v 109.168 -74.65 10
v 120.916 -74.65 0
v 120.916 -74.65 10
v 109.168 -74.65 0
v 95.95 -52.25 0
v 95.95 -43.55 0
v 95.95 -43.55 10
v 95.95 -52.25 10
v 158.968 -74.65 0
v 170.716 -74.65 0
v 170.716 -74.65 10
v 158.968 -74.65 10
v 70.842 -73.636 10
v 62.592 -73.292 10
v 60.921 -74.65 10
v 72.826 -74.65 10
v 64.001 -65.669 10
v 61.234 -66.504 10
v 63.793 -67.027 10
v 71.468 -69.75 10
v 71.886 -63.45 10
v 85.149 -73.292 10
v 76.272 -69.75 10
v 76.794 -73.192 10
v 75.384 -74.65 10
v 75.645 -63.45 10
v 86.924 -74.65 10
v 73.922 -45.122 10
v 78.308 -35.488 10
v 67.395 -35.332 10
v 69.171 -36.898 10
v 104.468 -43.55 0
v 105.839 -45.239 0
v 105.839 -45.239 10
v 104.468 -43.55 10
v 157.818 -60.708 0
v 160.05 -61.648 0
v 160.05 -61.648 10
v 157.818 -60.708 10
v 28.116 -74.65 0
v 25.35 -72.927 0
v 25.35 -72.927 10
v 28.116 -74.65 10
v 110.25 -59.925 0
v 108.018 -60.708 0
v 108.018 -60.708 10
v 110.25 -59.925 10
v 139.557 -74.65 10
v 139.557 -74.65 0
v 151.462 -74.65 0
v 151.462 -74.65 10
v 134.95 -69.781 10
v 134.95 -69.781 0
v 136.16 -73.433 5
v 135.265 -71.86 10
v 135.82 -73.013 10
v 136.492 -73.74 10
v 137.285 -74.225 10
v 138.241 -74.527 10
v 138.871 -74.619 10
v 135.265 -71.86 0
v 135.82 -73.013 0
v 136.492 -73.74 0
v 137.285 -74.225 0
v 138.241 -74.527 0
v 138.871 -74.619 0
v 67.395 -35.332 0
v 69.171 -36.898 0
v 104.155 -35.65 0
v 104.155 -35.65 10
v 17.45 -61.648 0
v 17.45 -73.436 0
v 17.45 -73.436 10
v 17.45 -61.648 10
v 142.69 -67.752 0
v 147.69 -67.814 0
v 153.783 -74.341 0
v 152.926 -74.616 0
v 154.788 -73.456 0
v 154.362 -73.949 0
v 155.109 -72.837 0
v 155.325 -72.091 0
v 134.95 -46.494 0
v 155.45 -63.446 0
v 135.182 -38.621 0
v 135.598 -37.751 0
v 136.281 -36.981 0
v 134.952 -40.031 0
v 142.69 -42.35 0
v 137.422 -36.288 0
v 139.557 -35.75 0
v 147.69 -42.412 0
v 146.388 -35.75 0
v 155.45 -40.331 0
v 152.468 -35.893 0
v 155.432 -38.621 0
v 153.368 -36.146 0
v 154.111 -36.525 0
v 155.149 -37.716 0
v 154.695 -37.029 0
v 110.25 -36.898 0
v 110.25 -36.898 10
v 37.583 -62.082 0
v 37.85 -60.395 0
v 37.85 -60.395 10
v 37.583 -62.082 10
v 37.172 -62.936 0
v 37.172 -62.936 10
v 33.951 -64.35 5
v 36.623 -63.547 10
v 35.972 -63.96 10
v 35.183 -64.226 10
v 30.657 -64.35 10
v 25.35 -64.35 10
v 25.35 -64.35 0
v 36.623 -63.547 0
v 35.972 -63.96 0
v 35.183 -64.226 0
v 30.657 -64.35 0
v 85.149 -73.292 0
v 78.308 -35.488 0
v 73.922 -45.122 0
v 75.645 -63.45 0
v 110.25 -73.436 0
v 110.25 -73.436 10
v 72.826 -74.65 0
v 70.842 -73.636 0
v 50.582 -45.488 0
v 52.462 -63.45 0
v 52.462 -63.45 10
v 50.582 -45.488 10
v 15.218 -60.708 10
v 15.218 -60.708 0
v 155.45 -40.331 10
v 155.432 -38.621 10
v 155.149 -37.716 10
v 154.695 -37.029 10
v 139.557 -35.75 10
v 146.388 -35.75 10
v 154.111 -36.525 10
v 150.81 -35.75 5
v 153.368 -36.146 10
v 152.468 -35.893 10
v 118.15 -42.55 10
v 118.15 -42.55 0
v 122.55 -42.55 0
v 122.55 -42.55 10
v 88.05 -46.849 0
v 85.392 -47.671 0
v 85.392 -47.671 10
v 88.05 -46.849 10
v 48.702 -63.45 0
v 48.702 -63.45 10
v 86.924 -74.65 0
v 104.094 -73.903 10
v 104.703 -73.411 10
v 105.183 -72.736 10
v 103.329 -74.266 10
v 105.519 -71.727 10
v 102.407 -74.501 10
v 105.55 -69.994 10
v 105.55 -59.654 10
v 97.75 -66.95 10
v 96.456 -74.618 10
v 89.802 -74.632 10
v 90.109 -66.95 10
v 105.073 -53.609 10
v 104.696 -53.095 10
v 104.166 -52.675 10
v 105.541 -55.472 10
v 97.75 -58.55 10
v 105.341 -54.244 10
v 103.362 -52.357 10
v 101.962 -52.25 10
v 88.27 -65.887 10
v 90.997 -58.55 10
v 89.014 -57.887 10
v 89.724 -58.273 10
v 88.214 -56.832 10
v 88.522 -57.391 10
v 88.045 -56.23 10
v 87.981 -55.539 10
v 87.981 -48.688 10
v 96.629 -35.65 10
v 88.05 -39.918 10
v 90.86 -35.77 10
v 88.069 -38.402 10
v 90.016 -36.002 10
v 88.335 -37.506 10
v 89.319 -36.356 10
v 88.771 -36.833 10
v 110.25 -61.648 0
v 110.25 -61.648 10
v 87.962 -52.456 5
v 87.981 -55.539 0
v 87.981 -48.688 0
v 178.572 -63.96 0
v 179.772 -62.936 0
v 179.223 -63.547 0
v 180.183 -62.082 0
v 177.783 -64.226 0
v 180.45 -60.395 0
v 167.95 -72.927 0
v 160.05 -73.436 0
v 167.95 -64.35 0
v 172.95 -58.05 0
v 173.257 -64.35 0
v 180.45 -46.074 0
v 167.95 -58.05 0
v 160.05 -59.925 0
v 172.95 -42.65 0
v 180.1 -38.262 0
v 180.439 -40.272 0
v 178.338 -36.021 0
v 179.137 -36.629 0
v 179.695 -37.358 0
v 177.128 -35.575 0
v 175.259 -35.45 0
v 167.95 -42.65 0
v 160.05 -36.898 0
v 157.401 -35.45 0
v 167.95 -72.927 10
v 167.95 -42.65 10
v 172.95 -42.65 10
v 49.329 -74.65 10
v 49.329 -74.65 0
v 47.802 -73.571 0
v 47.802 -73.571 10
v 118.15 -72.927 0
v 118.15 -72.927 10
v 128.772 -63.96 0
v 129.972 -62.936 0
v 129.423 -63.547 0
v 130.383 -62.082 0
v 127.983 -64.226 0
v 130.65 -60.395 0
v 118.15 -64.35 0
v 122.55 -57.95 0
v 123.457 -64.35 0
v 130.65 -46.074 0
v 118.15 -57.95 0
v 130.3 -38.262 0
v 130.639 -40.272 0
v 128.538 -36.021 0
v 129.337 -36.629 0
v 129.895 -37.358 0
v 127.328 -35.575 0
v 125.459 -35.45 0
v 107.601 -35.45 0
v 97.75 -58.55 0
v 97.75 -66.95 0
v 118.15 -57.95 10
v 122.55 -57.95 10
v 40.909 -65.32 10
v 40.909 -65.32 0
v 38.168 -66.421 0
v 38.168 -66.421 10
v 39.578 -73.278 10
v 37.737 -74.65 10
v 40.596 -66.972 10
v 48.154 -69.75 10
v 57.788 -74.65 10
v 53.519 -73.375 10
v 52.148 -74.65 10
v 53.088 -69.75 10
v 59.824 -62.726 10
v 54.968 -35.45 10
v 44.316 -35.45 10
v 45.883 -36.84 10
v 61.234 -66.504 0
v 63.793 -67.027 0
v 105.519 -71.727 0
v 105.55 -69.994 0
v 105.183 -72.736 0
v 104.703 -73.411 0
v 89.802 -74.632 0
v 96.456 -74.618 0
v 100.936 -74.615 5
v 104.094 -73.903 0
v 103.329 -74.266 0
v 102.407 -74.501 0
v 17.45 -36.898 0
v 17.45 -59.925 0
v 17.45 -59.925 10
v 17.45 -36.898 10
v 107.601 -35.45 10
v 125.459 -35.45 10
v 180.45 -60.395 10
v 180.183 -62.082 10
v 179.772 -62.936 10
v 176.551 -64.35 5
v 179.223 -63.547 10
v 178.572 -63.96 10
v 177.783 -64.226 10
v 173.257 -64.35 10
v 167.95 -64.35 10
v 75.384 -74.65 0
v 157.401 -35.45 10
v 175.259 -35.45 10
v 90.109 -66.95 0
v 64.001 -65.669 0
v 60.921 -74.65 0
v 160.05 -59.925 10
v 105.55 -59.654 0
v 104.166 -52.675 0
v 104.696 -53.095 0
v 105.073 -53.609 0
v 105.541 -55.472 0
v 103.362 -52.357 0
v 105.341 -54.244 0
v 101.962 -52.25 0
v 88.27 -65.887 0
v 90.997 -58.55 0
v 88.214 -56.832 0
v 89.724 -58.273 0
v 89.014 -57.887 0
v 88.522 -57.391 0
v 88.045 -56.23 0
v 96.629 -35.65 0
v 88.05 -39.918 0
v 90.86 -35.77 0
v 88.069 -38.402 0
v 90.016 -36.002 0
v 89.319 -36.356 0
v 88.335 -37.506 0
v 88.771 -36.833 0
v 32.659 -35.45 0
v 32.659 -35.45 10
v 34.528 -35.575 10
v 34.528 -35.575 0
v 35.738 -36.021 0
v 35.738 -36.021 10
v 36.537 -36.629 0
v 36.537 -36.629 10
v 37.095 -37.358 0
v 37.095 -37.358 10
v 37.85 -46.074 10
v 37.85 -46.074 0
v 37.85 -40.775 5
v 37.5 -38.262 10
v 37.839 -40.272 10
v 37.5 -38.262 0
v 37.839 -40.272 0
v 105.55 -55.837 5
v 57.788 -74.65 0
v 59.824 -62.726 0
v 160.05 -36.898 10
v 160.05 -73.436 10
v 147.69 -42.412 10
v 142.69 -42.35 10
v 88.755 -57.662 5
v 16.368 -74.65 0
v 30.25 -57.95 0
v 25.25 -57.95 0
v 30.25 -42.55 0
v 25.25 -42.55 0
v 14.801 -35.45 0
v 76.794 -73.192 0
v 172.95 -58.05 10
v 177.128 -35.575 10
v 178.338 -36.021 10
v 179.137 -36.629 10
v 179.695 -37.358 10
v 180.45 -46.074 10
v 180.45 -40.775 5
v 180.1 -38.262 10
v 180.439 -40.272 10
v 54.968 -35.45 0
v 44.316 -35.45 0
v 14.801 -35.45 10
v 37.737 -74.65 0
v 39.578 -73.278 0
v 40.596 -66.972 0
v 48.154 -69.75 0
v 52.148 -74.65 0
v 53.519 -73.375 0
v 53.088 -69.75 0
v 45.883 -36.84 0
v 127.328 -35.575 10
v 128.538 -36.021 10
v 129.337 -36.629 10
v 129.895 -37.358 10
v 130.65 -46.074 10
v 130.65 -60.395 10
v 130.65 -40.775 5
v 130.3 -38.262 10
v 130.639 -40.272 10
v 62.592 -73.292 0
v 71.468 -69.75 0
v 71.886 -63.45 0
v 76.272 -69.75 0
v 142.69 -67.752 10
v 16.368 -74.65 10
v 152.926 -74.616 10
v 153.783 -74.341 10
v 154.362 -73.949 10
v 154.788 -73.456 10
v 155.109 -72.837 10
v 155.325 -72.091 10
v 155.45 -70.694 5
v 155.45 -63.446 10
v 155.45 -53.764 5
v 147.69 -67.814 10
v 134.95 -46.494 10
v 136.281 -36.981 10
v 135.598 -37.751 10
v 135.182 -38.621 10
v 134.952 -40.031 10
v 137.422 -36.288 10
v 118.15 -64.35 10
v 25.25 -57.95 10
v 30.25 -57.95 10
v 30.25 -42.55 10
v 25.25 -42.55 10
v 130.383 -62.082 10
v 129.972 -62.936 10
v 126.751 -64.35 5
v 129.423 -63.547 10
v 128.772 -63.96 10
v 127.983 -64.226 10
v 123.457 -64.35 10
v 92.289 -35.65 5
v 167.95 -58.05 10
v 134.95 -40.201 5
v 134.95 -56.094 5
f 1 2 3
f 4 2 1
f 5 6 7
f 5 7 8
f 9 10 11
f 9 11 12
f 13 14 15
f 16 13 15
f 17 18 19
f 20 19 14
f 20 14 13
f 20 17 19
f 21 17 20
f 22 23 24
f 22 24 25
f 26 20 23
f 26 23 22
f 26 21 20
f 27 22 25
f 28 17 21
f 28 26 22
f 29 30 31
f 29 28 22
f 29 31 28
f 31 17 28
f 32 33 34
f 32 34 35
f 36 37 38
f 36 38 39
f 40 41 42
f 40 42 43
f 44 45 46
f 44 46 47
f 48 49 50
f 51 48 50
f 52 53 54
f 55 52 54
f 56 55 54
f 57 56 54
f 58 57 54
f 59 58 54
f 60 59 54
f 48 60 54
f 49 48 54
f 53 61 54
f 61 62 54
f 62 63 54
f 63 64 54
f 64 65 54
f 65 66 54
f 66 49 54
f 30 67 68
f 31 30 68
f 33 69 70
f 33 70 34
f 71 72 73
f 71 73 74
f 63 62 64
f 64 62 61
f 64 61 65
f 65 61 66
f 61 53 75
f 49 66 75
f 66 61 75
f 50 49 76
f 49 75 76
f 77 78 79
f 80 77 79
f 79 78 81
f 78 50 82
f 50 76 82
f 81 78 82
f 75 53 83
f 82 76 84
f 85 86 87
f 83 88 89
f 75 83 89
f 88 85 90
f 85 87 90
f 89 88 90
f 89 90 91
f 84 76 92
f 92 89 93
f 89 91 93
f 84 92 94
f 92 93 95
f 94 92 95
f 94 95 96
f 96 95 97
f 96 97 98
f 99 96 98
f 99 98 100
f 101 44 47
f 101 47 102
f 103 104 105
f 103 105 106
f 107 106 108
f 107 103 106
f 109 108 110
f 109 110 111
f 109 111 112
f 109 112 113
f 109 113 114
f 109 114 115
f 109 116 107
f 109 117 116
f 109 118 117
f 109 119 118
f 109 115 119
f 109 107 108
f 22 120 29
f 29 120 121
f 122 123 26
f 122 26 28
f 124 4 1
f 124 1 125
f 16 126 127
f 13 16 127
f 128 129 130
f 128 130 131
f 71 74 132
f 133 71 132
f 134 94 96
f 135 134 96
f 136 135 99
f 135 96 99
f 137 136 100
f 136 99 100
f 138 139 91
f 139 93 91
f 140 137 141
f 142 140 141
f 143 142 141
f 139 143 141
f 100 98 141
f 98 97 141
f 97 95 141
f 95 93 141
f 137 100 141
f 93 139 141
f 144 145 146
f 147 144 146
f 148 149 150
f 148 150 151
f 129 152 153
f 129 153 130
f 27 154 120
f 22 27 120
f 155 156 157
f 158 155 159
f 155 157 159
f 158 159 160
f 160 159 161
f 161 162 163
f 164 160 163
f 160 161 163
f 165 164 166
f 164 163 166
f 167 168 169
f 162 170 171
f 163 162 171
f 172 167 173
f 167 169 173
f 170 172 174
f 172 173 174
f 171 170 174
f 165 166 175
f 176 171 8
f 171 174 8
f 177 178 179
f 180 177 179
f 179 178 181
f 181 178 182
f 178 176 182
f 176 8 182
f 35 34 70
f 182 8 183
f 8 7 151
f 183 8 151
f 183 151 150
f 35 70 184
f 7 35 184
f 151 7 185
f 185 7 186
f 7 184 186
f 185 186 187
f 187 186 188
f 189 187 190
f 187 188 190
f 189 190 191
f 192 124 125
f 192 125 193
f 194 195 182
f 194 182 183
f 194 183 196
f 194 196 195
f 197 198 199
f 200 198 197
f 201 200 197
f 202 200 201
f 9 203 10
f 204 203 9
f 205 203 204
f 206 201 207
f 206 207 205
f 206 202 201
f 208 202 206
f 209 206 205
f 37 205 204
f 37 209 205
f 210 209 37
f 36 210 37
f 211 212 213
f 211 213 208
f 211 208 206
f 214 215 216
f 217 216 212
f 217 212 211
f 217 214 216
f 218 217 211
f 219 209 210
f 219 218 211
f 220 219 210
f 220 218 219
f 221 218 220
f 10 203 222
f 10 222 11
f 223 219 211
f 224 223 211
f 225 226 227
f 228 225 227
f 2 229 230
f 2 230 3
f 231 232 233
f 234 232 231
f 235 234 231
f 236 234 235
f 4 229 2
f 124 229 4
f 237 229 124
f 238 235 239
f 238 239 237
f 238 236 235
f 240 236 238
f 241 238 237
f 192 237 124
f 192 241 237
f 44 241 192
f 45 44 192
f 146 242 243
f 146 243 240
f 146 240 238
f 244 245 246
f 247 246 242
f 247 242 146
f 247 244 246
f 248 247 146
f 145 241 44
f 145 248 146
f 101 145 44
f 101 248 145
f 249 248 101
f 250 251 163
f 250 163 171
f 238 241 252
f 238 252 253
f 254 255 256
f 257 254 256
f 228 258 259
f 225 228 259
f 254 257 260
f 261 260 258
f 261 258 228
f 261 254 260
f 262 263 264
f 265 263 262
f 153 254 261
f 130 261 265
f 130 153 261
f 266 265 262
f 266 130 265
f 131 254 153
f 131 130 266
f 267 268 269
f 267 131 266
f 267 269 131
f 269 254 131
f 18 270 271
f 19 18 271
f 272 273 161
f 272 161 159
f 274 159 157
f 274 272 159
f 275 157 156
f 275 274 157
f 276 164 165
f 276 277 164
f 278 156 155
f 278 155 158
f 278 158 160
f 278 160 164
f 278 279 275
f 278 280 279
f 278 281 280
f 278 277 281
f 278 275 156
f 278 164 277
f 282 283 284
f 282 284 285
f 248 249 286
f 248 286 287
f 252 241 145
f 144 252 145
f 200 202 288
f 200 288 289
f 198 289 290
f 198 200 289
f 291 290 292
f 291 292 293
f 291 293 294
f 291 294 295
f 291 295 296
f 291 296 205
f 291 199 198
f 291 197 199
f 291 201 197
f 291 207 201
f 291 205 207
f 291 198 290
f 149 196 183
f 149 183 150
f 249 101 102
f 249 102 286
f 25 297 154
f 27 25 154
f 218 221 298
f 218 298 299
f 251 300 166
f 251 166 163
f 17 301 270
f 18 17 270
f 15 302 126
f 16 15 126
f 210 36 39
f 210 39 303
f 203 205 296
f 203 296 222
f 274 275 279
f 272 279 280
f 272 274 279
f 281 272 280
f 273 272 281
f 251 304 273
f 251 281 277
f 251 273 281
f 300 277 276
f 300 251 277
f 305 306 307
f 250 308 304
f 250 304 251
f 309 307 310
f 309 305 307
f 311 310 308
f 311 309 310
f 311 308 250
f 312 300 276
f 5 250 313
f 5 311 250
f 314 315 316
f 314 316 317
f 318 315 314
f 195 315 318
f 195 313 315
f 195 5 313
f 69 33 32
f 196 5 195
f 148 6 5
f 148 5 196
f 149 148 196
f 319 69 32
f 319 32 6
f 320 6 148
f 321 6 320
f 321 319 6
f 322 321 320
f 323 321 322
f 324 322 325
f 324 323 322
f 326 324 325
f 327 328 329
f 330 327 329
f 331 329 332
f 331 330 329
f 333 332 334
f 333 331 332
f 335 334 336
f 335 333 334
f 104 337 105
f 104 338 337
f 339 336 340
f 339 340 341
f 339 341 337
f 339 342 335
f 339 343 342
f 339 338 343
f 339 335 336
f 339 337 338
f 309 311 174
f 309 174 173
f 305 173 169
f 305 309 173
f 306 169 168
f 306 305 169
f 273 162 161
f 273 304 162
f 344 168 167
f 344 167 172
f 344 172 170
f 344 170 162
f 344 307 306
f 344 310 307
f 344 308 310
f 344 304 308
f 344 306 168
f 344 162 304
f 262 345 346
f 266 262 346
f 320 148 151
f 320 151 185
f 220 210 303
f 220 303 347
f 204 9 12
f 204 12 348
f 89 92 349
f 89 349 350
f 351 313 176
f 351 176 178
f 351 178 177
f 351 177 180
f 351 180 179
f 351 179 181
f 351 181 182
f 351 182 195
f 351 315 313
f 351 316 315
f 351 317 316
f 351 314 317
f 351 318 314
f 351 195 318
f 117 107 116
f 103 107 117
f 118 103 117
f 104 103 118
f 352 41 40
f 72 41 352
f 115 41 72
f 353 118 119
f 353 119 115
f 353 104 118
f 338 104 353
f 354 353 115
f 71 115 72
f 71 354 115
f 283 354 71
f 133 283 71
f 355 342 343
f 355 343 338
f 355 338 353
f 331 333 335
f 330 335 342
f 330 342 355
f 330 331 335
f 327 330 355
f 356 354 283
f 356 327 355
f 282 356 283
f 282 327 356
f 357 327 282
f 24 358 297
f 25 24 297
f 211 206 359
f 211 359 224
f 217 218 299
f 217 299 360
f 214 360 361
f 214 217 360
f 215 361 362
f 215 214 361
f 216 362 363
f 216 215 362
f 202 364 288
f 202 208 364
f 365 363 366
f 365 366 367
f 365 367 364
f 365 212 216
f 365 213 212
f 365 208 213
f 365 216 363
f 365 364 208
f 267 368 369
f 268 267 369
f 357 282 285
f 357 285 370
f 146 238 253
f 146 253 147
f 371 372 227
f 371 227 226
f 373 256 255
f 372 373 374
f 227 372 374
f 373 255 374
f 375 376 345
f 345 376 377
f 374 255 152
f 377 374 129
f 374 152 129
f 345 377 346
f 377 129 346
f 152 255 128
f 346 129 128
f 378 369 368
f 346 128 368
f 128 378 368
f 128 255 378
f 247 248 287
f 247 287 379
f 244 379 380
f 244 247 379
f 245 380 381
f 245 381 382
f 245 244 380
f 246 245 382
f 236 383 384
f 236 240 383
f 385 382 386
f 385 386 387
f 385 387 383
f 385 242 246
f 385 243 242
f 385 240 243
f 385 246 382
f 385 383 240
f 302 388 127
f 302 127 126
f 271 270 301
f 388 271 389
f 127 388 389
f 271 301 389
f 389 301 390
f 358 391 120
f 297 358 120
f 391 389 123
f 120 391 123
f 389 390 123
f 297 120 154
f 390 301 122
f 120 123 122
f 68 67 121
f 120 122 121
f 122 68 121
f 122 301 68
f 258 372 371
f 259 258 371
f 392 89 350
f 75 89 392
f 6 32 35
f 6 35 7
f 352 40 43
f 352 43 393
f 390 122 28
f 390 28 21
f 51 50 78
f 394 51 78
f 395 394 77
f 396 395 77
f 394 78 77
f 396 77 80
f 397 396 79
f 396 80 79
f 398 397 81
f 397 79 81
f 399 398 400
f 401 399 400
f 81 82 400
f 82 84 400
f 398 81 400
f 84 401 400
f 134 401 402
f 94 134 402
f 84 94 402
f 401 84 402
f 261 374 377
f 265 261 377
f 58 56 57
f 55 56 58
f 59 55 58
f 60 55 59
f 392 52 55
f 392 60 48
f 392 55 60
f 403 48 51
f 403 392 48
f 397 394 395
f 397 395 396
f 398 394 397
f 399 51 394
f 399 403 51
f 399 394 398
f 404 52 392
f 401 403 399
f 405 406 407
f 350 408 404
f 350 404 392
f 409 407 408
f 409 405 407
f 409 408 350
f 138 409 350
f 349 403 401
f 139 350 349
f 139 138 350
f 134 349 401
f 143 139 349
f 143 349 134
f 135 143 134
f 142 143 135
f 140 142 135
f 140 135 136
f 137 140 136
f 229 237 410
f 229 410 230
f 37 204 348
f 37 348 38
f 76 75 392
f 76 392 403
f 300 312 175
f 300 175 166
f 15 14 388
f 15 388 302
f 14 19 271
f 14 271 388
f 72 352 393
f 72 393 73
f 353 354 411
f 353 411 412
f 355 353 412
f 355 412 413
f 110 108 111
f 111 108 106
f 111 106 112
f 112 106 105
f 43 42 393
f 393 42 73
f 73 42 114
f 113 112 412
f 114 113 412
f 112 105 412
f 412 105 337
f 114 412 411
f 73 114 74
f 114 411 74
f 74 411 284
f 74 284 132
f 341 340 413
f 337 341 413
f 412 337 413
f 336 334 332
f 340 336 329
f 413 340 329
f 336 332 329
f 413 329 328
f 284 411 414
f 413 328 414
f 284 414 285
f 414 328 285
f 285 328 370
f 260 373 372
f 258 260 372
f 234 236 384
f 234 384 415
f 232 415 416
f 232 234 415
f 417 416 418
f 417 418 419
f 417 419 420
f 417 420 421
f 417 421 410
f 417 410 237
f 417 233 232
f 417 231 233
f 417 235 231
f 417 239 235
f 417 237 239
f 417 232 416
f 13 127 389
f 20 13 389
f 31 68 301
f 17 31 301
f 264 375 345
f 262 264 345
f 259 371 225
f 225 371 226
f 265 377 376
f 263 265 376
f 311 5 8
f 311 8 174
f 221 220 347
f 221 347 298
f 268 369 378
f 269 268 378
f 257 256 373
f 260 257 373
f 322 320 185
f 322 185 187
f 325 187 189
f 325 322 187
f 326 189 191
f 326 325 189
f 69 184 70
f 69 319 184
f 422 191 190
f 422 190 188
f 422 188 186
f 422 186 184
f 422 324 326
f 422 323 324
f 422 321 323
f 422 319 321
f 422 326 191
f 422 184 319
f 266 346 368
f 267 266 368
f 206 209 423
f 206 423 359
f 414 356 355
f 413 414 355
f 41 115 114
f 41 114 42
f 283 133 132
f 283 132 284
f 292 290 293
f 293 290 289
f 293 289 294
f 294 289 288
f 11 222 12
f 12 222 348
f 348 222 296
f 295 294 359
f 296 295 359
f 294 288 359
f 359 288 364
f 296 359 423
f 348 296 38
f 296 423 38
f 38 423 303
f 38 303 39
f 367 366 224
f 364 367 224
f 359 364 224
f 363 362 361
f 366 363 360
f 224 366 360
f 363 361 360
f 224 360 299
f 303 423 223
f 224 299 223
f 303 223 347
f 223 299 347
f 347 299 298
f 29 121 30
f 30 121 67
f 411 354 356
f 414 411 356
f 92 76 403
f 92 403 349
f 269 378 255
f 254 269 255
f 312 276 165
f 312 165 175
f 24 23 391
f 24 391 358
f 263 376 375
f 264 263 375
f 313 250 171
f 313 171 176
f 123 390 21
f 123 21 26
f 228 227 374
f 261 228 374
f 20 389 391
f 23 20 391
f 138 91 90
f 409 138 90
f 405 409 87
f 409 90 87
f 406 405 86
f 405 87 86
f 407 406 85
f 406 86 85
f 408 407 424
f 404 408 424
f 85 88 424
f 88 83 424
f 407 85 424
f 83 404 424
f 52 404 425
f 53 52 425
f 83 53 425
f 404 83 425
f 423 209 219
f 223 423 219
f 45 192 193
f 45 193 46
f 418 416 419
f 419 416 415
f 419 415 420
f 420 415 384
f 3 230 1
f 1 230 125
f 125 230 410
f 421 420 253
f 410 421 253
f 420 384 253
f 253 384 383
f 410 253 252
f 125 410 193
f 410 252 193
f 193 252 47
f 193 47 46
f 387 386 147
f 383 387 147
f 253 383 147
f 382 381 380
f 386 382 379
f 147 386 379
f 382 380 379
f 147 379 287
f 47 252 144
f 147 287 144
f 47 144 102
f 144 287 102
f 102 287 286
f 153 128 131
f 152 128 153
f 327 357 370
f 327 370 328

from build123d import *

# Parameters (mm, degrees)
BOSS_EXTRUDE1_DEPTH   = 10
MODEL_W               = 4.4
MODEL_H               = 15.4
BOSS_EXTRUDE1_2_DEPTH = 10
BOSS_EXTRUDE1_3_DEPTH = 10
MODEL_W_2             = 5
BOSS_EXTRUDE1_4_DEPTH = 10
BOSS_EXTRUDE1_5_DEPTH = 10
BOSS_EXTRUDE1_6_DEPTH = 10
BOSS_EXTRUDE1_7_DEPTH = 10


with BuildPart() as part:
    # Model → Boss-Extrude1 (new body)
    with BuildSketch(Plane.XY):
        with BuildLine():
            Line((89.802370268, -74.632247239), (88.270151162, -65.887314442))
            Line((88.270151162, -65.887314442), (90.109114907, -66.95))
            Line((90.109114907, -66.95), (97.75, -66.95))
            Line((97.75, -66.95), (97.75, -58.55))
            Line((97.75, -58.55), (90.996777975, -58.55))
            add(Edge.make_bspline(
                [(90.996777975, -58.55), (88.020495925, -58.280254726), (87.981334319, -55.538942312)],
                knots=[5, 5, 5, 6, 6, 6], degree=2))
            add(Edge.make_bspline(
                [(87.981334319, -55.538942312), (87.942172713, -52.797629897), (87.981334319, -48.687854259)],
                knots=[6, 6, 6, 7, 7, 7], degree=2))
            Line((87.981334319, -48.687854259), (85.391839562, -47.670748997))
            Line((85.391839562, -47.670748997), (88.05, -46.849451765))
            Line((88.05, -46.849451765), (88.05, -39.917847516))
            add(Edge.make_bspline(
                [(88.05, -39.917847516), (87.589718259, -35.65), (92.28911097, -35.65)],
                knots=[10, 10, 10, 11, 11, 11], degree=2))
            add(Edge.make_bspline(
                [(92.28911097, -35.65), (96.988503681, -35.65), (104.155077565, -35.65)],
                knots=[11, 11, 11, 12, 12, 12], degree=2))
            Line((104.155077565, -35.65), (105.83902662, -45.239271253))
            Line((105.83902662, -45.239271253), (104.468370413, -43.55))
            Line((104.468370413, -43.55), (95.95, -43.55))
            Line((95.95, -43.55), (95.95, -52.25))
            Line((95.95, -52.25), (101.962027633, -52.25))
            add(Edge.make_bspline(
                [(101.962027633, -52.25), (105.55, -52.057945352), (105.55, -55.837040324)],
                knots=[17, 17, 17, 18, 18, 18], degree=2))
            add(Edge.make_bspline(
                [(105.55, -55.837040324), (105.55, -59.616135296), (105.55, -69.993960865)],
                knots=[18, 18, 18, 19, 19, 19], degree=2))
            add(Edge.make_bspline(
                [(105.55, -69.993960865), (106.066548566, -74.615030364), (100.93637819, -74.615030364)],
                knots=[19, 19, 19, 20, 20, 20], degree=2))
            add(Edge.make_bspline(
                [(100.93637819, -74.615030364), (95.806207814, -74.615030364), (89.802370268, -74.632247239)],
                knots=[20, 20, 20, 21, 21, 21], degree=2))
        make_face()
    extrude(amount=BOSS_EXTRUDE1_DEPTH)


with BuildPart() as body_2:
    # Model → Boss-Extrude1 2 (new body)
    with BuildSketch(Plane.XY):
        with BuildLine():
            Line((107.601298886, -35.45), (125.458991188, -35.45))
            add(Edge.make_bspline(
                [(125.458991188, -35.45), (130.65, -35.175101229), (130.65, -40.775210876)],
                knots=[1, 1, 1, 2, 2, 2], degree=2))
            add(Edge.make_bspline(
                [(130.65, -40.775210876), (130.65, -46.375320523), (130.65, -60.395175444)],
                knots=[2, 2, 2, 3, 3, 3], degree=2))
            add(Edge.make_bspline(
                [(130.65, -60.395175444), (130.549999958, -64.35), (126.751324183, -64.35)],
                knots=[3, 3, 3, 4, 4, 4], degree=2))
            add(Edge.make_bspline(
                [(126.751324183, -64.35), (122.952648409, -64.35), (118.15, -64.35)],
                knots=[4, 4, 4, 5, 5, 5], degree=2))
            Line((118.15, -64.35), (118.15, -72.926889339))
            Line((118.15, -72.926889339), (120.916244901, -74.65))
            Line((120.916244901, -74.65), (109.167763123, -74.65))
            Line((109.167763123, -74.65), (110.25, -73.435990216))
            Line((110.25, -73.435990216), (110.25, -61.648346833))
            Line((110.25, -61.648346833), (108.017788462, -60.708468291))
            Line((108.017788462, -60.708468291), (110.25, -59.925236173))
            Line((110.25, -59.925236173), (110.25, -36.89821189))
            Line((110.25, -36.89821189), (107.601298886, -35.45))
        make_face()
        with Locations((120.35, -50.25)):
            Rectangle(MODEL_W, MODEL_H, mode=Mode.SUBTRACT)
    extrude(amount=BOSS_EXTRUDE1_2_DEPTH)


with BuildPart() as body_3:
    # Model → Boss-Extrude1 3 (new body)
    with BuildSketch(Plane.XY):
        with BuildLine():
            Line((139.55716932, -74.65), (151.462297521, -74.65))
            add(Edge.make_bspline(
                [(151.462297521, -74.65), (155.45, -75.054430949), (155.45, -70.694438823)],
                knots=[1, 1, 1, 2, 2, 2], degree=2))
            add(Edge.make_bspline(
                [(155.45, -70.694438823), (155.45, -66.334446697), (155.45, -40.331140363)],
                knots=[2, 2, 2, 3, 3, 3], degree=2))
            add(Edge.make_bspline(
                [(155.45, -40.331140363), (156.005043808, -35.75), (150.809604089, -35.75)],
                knots=[3, 3, 3, 4, 4, 4], degree=2))
            add(Edge.make_bspline(
                [(150.809604089, -35.75), (145.61416437, -35.75), (139.55716932, -35.75)],
                knots=[4, 4, 4, 5, 5, 5], degree=2))
            add(Edge.make_bspline(
                [(139.55716932, -35.75), (134.95, -36.310548822), (134.95, -40.200601677)],
                knots=[5, 5, 5, 6, 6, 6], degree=2))
            add(Edge.make_bspline(
                [(134.95, -40.200601677), (134.95, -44.090654532), (134.95, -69.780668018)],
                knots=[6, 6, 6, 7, 7, 7], degree=2))
            add(Edge.make_bspline(
                [(134.95, -69.780668018), (135.066638508, -74.65), (139.55716932, -74.65)],
                knots=[7, 7, 7, 8, 8, 8], degree=2))
        make_face()
        Polygon((142.690097794, -67.751932061), (147.689717496, -67.81359919), (147.689717496, -42.41166713), (142.690097794, -42.35), align=None, mode=Mode.SUBTRACT)
    extrude(amount=BOSS_EXTRUDE1_3_DEPTH)


with BuildPart() as body_4:
    # Model → Boss-Extrude1 4 (new body)
    with BuildSketch(Plane.XY):
        with BuildLine():
            Line((14.801298886, -35.45), (32.658991188, -35.45))
            add(Edge.make_bspline(
                [(32.658991188, -35.45), (37.85, -35.175101229), (37.85, -40.775210876)],
                knots=[1, 1, 1, 2, 2, 2], degree=2))
            add(Edge.make_bspline(
                [(37.85, -40.775210876), (37.85, -46.375320523), (37.85, -60.395175444)],
                knots=[2, 2, 2, 3, 3, 3], degree=2))
            add(Edge.make_bspline(
                [(37.85, -60.395175444), (37.749999958, -64.35), (33.951324183, -64.35)],
                knots=[3, 3, 3, 4, 4, 4], degree=2))
            add(Edge.make_bspline(
                [(33.951324183, -64.35), (30.152648409, -64.35), (25.35, -64.35)],
                knots=[4, 4, 4, 5, 5, 5], degree=2))
            Line((25.35, -64.35), (25.35, -72.926889339))
            Line((25.35, -72.926889339), (28.116244901, -74.65))
            Line((28.116244901, -74.65), (16.367763123, -74.65))
            Line((16.367763123, -74.65), (17.45, -73.435990216))
            Line((17.45, -73.435990216), (17.45, -61.648346833))
            Line((17.45, -61.648346833), (15.217788462, -60.708468291))
            Line((15.217788462, -60.708468291), (17.45, -59.925236173))
            Line((17.45, -59.925236173), (17.45, -36.89821189))
            Line((17.45, -36.89821189), (14.801298886, -35.45))
        make_face()
        with Locations((27.75, -50.25)):
            Rectangle(MODEL_W_2, MODEL_H, mode=Mode.SUBTRACT)
    extrude(amount=BOSS_EXTRUDE1_4_DEPTH)


with BuildPart() as body_5:
    # Model → Boss-Extrude1 5 (new body)
    with BuildSketch(Plane.XY):
        with BuildLine():
            Line((157.401298886, -35.45), (175.258991188, -35.45))
            add(Edge.make_bspline(
                [(175.258991188, -35.45), (180.45, -35.175101229), (180.45, -40.775210876)],
                knots=[1, 1, 1, 2, 2, 2], degree=2))
            add(Edge.make_bspline(
                [(180.45, -40.775210876), (180.45, -46.375320523), (180.45, -60.395175444)],
                knots=[2, 2, 2, 3, 3, 3], degree=2))
            add(Edge.make_bspline(
                [(180.45, -60.395175444), (180.349999958, -64.35), (176.551324183, -64.35)],
                knots=[3, 3, 3, 4, 4, 4], degree=2))
            add(Edge.make_bspline(
                [(176.551324183, -64.35), (172.752648409, -64.35), (167.95, -64.35)],
                knots=[4, 4, 4, 5, 5, 5], degree=2))
            Line((167.95, -64.35), (167.95, -72.926889339))
            Line((167.95, -72.926889339), (170.716244901, -74.65))
            Line((170.716244901, -74.65), (158.967763123, -74.65))
            Line((158.967763123, -74.65), (160.05, -73.435990216))
            Line((160.05, -73.435990216), (160.05, -61.648346833))
            Line((160.05, -61.648346833), (157.817788462, -60.708468291))
            Line((157.817788462, -60.708468291), (160.05, -59.925236173))
            Line((160.05, -59.925236173), (160.05, -36.89821189))
            Line((160.05, -36.89821189), (157.401298886, -35.45))
        make_face()
        with Locations((170.45, -50.35)):
            Rectangle(MODEL_W_2, MODEL_H, mode=Mode.SUBTRACT)
    extrude(amount=BOSS_EXTRUDE1_5_DEPTH)


with BuildPart() as body_6:
    # Model → Boss-Extrude1 6 (new body)
    with BuildSketch(Plane.XY):
        Polygon((37.736993919, -74.65), (49.328829272, -74.65), (47.801526641, -73.570656207), (48.153981094, -69.75), (53.088343441, -69.75), (53.519121106, -73.374848178), (52.148464899, -74.65), (57.787736152, -74.65), (59.82413966, -62.725674761), (54.968100525, -35.45), (44.316143714, -35.45), (45.882607951, -36.839853245), (40.909083998, -65.319939271), (38.167771584, -66.421263496), (40.595791151, -66.971925609), (39.577589397, -73.278143978), align=None)
        Polygon((48.702243577, -63.45), (52.461757746, -63.45), (50.582000662, -45.48787675), align=None, mode=Mode.SUBTRACT)
    extrude(amount=BOSS_EXTRUDE1_6_DEPTH)


with BuildPart() as body_7:
    # Model → Boss-Extrude1 7 (new body)
    with BuildSketch(Plane.XY):
        Polygon((60.920664625, -74.65), (72.825792826, -74.65), (70.841604793, -73.635925551), (71.468190488, -69.75), (76.272014148, -69.75), (76.794168893, -73.192094017), (75.38435108, -74.65), (86.923970959, -74.65), (85.148644824, -73.292397661), (78.308417656, -35.488394076), (67.395383472, -35.331747653), (69.170709607, -36.89821189), (64.001377625, -65.668938375), (61.233957473, -66.504385968), (63.792515727, -67.026540714), (62.591559812, -73.292397661), align=None)
        Polygon((71.885914284, -63.45), (75.645428453, -63.45), (73.922317792, -45.122368428), align=None, mode=Mode.SUBTRACT)
    extrude(amount=BOSS_EXTRUDE1_7_DEPTH)


solid = Compound([part.part, body_2.part, body_3.part, body_4.part, body_5.part, body_6.part, body_7.part])
